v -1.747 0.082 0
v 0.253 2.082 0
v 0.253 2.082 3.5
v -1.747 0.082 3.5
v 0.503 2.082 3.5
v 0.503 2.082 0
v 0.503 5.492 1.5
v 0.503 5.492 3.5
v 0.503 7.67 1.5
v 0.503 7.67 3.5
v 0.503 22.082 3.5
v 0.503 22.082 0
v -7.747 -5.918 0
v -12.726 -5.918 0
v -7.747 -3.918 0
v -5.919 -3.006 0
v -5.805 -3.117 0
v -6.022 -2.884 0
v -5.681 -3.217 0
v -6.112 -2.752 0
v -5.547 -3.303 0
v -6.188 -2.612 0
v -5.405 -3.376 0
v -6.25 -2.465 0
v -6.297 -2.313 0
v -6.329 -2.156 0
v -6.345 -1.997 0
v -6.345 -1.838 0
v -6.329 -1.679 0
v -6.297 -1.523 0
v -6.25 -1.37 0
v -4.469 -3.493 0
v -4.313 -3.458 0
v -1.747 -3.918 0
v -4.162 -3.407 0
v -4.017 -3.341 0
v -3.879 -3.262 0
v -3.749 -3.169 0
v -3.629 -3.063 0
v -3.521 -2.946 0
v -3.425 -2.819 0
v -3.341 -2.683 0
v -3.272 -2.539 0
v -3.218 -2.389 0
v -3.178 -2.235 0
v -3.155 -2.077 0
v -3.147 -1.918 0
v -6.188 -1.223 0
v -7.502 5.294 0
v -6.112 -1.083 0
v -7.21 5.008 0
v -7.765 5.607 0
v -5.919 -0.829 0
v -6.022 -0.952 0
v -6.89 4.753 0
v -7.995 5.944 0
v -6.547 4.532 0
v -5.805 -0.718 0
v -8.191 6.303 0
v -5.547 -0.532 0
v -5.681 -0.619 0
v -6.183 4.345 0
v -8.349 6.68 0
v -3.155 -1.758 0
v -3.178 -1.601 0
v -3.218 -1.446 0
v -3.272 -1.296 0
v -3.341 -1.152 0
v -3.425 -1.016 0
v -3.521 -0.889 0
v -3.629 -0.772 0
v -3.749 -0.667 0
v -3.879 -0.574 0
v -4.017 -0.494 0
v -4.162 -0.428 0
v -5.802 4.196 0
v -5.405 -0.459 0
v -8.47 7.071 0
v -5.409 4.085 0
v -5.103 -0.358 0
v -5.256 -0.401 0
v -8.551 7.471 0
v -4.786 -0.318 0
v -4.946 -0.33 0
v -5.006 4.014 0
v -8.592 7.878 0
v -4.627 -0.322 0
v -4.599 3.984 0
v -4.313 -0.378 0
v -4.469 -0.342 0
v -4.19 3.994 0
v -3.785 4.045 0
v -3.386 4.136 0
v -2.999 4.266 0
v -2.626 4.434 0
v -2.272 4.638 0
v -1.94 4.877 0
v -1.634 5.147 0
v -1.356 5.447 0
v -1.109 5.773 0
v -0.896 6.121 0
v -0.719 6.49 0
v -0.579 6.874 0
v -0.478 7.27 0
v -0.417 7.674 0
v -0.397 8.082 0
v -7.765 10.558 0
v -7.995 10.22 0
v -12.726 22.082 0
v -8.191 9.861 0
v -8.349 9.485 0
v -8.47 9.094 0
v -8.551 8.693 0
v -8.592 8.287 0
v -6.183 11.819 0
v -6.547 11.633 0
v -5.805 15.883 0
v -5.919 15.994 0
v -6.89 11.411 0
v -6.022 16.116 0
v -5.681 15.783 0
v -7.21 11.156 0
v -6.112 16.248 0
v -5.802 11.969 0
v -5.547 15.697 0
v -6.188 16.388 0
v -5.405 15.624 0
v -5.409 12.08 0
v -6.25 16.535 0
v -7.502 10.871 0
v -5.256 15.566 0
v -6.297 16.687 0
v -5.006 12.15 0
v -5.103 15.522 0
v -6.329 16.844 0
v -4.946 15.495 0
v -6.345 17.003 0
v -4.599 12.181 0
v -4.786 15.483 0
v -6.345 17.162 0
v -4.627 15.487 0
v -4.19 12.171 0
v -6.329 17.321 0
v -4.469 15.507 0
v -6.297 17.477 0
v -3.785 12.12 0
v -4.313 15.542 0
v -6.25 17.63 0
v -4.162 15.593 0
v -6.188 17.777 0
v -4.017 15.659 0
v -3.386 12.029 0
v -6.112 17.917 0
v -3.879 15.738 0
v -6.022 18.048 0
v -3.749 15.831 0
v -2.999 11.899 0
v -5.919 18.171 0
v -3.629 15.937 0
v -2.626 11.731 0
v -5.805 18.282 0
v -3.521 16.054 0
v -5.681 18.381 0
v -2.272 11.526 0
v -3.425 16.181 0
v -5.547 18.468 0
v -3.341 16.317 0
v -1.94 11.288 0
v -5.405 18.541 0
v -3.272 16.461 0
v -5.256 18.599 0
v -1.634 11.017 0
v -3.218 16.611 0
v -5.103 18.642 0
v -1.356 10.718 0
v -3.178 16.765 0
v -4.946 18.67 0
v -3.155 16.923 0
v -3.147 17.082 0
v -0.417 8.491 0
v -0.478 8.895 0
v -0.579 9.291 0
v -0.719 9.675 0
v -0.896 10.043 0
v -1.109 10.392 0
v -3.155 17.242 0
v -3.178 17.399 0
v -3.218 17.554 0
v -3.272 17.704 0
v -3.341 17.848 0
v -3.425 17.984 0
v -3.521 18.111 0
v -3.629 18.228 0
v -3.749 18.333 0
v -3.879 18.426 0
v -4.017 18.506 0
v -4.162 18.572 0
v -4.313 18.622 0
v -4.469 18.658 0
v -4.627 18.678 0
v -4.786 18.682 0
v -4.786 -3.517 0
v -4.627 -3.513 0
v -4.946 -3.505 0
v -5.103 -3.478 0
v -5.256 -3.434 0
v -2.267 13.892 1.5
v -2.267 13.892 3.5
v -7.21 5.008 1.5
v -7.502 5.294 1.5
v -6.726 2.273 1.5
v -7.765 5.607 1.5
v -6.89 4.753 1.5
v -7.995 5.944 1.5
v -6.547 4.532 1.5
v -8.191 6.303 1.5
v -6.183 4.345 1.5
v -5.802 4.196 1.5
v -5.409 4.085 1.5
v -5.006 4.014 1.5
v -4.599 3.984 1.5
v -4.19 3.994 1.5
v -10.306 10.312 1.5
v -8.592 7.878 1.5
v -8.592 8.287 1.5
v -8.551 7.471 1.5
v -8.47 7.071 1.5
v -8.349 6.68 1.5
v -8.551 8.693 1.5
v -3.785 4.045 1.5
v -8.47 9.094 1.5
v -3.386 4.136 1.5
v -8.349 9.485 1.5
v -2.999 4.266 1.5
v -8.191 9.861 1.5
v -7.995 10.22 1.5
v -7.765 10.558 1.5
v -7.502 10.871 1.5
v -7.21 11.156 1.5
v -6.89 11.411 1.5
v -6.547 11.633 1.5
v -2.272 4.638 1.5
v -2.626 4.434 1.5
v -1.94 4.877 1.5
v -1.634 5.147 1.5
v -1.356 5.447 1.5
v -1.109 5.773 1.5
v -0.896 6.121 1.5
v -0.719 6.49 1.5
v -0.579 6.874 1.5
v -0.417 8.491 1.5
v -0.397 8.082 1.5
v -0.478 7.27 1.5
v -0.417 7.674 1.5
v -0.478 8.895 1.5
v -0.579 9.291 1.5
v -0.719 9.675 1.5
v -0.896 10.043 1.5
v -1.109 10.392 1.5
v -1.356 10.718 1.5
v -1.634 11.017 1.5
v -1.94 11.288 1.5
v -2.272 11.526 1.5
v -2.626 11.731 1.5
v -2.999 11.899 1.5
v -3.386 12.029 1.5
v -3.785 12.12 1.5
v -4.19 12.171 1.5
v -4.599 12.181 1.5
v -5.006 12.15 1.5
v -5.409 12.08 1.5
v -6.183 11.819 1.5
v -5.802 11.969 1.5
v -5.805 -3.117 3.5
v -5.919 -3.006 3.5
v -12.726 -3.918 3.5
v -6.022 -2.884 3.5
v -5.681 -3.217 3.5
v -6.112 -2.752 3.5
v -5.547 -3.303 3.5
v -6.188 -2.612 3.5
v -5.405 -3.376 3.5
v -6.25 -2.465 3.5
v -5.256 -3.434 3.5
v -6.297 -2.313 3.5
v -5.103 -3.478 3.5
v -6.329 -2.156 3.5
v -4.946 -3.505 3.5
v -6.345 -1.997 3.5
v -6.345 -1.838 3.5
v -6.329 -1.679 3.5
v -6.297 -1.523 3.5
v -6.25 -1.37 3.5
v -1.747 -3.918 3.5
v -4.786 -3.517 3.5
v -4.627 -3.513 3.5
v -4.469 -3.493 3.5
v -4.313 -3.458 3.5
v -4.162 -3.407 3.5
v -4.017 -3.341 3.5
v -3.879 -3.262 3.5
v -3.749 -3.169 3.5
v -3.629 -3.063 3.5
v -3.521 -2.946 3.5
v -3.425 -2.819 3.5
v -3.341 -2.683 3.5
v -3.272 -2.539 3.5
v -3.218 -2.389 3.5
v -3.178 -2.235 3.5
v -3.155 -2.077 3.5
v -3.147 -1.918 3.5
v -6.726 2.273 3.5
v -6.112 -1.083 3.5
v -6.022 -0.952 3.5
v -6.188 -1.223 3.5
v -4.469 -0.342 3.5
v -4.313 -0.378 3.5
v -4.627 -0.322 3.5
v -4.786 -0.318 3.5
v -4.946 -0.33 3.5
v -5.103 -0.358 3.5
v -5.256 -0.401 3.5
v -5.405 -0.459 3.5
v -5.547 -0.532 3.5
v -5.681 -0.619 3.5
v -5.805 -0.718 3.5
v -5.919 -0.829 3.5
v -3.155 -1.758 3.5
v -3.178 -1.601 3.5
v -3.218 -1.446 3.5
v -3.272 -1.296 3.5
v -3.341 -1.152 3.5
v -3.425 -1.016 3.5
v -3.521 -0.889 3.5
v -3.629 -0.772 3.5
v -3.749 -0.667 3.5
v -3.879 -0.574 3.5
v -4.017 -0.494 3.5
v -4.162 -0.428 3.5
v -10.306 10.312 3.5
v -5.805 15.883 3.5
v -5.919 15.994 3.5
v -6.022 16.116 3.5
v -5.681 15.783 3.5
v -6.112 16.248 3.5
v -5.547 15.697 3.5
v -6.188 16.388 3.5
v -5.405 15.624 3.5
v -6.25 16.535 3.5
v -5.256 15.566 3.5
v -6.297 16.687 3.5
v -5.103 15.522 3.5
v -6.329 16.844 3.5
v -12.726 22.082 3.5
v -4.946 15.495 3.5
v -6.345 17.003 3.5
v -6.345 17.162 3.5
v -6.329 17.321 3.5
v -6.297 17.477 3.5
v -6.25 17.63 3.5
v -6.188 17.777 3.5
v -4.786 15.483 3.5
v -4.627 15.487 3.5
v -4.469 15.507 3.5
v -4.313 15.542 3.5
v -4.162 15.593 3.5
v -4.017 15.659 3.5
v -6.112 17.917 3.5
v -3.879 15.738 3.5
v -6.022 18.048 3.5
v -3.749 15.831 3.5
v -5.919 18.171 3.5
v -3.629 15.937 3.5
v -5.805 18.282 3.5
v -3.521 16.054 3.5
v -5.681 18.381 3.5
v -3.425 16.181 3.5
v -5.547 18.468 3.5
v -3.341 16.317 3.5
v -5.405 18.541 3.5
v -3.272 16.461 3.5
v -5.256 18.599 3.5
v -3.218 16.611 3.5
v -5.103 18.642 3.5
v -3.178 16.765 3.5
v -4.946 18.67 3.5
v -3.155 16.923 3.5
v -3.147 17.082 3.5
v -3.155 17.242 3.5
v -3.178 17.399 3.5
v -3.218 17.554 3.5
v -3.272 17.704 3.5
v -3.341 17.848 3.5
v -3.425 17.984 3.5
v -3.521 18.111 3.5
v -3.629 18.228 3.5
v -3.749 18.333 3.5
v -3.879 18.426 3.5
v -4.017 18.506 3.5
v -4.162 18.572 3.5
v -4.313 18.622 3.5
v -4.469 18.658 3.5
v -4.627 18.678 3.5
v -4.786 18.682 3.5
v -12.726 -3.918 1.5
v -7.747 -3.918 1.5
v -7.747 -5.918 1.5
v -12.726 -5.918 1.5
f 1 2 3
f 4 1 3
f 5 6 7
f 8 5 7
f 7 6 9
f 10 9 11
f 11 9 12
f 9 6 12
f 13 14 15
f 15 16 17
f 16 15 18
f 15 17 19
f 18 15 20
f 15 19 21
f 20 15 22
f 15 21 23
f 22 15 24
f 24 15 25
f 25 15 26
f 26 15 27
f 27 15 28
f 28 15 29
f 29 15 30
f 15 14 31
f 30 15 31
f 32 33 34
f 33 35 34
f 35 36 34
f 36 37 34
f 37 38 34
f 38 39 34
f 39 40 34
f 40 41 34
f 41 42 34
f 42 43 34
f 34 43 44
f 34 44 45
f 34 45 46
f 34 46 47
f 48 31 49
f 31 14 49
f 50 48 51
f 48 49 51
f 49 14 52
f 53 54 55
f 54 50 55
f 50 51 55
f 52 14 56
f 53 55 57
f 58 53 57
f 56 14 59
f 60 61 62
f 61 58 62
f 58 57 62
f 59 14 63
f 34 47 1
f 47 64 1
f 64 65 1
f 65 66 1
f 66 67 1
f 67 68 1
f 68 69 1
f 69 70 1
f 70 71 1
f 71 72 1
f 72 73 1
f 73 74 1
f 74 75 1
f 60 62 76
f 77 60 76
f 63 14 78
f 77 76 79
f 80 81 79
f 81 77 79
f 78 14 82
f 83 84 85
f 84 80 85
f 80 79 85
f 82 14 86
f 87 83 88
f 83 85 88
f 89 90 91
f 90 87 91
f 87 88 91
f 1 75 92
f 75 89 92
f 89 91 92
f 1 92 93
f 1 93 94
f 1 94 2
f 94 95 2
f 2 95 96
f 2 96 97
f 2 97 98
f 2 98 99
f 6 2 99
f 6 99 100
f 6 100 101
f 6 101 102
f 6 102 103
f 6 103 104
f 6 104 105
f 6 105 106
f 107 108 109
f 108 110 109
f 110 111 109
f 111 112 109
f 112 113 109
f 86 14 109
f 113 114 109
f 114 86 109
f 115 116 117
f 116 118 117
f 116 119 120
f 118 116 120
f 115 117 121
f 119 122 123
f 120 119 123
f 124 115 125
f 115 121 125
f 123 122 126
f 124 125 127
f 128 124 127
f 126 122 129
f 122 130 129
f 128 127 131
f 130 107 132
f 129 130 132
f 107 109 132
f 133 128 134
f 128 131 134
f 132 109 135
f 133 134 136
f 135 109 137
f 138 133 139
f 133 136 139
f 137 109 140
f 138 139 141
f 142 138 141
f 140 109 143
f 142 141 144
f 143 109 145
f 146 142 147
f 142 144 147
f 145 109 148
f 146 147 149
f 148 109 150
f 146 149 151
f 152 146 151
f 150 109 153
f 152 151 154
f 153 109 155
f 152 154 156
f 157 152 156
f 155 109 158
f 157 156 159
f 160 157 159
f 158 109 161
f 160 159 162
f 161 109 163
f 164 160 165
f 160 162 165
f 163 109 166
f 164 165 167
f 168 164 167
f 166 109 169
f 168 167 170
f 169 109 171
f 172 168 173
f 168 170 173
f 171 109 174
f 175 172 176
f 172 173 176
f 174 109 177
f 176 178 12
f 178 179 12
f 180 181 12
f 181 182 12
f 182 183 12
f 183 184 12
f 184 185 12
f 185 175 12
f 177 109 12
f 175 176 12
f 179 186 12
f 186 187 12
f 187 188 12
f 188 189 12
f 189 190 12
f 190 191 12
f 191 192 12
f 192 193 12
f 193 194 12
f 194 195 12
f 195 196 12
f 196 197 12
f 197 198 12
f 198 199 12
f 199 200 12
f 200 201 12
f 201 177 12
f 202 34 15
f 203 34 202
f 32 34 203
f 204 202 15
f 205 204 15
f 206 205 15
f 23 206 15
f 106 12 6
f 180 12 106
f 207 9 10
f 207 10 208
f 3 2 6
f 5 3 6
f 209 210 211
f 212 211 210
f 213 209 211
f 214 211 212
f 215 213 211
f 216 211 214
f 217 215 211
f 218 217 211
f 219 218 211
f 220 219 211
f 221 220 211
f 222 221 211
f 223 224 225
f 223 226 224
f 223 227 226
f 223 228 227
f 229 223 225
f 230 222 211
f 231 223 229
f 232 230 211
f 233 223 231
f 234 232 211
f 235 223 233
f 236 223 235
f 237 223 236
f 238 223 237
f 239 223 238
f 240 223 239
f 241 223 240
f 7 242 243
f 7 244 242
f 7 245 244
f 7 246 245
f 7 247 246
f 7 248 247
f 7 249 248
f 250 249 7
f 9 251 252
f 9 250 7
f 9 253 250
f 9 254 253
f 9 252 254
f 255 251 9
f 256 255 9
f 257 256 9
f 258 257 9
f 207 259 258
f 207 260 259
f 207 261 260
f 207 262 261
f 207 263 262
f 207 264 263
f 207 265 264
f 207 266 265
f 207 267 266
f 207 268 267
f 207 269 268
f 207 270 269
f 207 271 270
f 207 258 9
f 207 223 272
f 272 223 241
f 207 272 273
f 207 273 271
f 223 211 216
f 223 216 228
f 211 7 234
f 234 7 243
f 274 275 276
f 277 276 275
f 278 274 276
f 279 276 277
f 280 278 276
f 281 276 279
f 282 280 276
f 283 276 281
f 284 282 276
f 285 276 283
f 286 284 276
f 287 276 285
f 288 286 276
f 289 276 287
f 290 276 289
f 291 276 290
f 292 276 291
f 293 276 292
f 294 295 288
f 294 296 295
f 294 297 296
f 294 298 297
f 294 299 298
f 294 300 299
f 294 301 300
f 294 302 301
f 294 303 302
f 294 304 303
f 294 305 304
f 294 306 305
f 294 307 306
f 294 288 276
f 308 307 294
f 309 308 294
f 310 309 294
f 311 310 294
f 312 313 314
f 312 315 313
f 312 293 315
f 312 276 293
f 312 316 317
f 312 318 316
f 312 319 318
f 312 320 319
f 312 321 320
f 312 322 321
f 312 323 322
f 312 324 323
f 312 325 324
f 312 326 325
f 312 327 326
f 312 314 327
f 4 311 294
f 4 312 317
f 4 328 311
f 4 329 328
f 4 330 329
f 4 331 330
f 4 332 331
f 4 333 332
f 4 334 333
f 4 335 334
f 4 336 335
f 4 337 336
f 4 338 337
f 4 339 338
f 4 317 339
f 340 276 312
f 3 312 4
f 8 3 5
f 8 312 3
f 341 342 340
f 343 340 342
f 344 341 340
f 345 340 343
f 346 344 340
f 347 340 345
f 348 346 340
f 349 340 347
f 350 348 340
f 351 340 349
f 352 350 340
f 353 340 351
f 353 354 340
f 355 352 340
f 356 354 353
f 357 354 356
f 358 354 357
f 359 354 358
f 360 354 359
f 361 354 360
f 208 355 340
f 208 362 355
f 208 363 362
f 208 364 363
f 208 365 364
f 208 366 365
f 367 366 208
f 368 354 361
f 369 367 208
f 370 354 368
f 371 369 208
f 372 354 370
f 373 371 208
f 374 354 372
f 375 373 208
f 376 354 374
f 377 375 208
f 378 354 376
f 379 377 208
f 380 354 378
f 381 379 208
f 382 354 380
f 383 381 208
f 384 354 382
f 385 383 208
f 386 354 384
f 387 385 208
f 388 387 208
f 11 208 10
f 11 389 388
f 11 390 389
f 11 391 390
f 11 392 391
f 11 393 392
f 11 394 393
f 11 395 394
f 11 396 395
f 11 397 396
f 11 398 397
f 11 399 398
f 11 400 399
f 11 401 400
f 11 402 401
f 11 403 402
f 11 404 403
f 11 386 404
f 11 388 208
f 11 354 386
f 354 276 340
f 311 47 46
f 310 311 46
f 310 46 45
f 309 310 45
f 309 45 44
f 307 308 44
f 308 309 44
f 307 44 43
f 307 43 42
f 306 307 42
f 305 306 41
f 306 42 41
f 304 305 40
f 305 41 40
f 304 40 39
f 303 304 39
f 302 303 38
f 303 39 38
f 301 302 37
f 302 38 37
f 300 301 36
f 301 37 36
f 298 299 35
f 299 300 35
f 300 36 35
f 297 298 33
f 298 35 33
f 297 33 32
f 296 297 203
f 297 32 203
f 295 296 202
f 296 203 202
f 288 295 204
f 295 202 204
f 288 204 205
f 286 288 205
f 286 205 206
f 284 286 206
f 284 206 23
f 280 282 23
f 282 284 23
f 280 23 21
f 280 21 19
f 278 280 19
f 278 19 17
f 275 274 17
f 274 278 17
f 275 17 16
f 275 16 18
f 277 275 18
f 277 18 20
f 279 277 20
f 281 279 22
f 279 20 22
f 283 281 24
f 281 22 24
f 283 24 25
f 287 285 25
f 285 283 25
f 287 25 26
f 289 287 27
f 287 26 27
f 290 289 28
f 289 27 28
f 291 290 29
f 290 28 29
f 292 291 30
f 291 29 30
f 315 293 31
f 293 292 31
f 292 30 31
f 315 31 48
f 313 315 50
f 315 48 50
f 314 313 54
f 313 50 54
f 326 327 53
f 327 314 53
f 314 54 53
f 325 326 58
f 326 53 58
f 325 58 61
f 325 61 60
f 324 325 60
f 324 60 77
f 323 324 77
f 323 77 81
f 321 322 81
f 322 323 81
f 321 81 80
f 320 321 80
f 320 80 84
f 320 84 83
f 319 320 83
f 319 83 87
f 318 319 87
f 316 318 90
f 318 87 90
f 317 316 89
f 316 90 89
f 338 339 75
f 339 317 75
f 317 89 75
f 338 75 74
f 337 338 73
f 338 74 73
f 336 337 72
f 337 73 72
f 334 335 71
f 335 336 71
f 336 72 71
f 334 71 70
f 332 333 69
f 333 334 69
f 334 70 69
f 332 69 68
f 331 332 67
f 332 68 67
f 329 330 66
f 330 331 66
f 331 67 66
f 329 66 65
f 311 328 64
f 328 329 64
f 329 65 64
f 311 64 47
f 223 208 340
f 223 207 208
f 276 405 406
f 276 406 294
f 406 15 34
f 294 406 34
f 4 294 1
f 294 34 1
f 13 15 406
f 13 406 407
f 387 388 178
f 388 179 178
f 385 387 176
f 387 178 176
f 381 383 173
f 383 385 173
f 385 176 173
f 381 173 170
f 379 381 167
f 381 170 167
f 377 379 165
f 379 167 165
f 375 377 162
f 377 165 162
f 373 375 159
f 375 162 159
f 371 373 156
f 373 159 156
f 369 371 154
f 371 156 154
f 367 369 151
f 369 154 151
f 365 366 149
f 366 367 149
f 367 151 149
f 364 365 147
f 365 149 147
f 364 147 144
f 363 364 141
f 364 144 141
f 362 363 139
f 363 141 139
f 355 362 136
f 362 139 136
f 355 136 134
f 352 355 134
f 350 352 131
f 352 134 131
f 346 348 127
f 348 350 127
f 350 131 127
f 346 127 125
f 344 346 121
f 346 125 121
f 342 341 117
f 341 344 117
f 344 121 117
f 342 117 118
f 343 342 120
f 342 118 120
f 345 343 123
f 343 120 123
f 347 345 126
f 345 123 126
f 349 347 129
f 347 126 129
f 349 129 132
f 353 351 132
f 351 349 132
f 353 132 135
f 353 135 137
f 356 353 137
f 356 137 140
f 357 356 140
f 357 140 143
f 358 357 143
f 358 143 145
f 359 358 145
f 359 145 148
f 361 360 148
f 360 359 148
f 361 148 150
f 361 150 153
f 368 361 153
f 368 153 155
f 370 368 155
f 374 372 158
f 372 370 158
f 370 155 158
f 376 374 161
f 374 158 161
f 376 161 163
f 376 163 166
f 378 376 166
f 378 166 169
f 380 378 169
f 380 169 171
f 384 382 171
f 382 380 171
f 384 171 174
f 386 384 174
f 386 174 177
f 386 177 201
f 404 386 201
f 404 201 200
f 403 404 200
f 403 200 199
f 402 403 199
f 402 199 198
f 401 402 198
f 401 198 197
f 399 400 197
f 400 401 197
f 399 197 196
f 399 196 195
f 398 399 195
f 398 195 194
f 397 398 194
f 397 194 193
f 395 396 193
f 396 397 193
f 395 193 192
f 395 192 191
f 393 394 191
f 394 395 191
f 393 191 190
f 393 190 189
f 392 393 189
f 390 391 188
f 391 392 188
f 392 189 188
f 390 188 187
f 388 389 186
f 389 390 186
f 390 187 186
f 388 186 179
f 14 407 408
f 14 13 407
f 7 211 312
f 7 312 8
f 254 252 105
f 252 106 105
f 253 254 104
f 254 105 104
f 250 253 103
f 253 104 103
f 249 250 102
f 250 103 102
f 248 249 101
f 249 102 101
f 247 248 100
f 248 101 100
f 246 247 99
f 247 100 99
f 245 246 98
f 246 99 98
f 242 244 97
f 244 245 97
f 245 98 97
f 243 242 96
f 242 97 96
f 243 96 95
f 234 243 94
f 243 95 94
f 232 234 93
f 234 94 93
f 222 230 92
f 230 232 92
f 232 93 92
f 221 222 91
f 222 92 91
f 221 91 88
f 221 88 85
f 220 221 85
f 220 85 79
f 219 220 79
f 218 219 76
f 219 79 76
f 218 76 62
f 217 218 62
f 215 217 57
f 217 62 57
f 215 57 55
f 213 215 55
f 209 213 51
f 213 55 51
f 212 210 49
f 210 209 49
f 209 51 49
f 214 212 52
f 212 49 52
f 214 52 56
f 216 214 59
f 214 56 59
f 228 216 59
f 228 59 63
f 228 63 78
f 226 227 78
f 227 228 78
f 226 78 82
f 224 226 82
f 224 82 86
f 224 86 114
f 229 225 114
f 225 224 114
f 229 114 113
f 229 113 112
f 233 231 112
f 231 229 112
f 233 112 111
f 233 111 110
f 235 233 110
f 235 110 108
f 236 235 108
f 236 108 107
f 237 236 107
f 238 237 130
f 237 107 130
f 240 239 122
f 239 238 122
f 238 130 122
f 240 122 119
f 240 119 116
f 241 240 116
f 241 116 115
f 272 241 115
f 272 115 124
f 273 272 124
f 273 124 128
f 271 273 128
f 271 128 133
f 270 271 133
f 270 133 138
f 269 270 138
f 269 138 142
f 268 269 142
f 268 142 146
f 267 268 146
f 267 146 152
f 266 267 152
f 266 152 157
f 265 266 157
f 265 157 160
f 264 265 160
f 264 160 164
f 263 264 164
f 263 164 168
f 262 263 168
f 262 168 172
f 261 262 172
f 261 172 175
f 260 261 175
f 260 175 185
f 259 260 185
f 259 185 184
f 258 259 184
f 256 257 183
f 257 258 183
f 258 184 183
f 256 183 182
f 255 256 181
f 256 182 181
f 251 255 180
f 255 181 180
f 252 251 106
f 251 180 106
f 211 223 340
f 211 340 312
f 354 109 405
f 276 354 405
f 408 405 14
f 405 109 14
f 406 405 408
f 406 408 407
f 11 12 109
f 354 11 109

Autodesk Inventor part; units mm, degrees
ref_plane "YZ Plane" through (0, 0, 0) normal (1, 0, 0) x (0, 1, 0)
ref_plane "XZ Plane" through (0, 0, 0) normal (0, 1, 0) x (-1, 0, 0)
ref_plane "Arbeitsebene1" through (0, 0, 0) normal (0, 0, 1) x (1, 0, 0)
sketch "Skizze1" plane through (0, 0, 0) normal (0, 0, 1) x (1, 0, 0)
  line L0 (-7.7466, -5.9177) -> (-1.7466, -5.9177)
  line L1 (-1.7466, -5.9177) -> (-1.7466, 2.0823)
  line L2 (-1.7466, 2.0823) -> (-7.7466, 2.0823)
  line L3 (-7.7466, 2.0823) -> (-7.7466, -5.9177)
  line L4 (-7.7466, -5.9177) -> (-1.7466, 2.0823) construction
  line L5 (-1.7466, -5.9177) -> (-7.7466, 2.0823) construction
  line L6 (-7.7466, -5.9177) -> (-1.7466, -5.9177)
  line L7 (-1.7466, -5.9177) -> (-1.7466, -3.9177)
  line L8 (-1.7466, -3.9177) -> (-7.7466, -3.9177)
  line L9 (-7.7466, -3.9177) -> (-7.7466, -5.9177)
  circle A0 centre (-4.7466, -1.9177) radius 1.6
  line L10 (0.5034, 22.0823) -> (-10.1632, 22.0823)
  line L11 (-10.1632, 22.0823) -> (-10.1632, 2.0823)
  line L12 (-10.1632, 2.0823) -> (0.5034, 2.0823)
  line L13 (0.5034, 2.0823) -> (0.5034, 22.0823)
  line L14 (0.5034, 22.0823) -> (-10.1632, 2.0823) construction
  line L15 (-10.1632, 22.0823) -> (0.5034, 2.0823) construction
  circle A1 centre (-4.7466, 17.0823) radius 1.6
  circle A2 centre (-4.4966, 8.0823) radius 4.1
  line L16 (-7.7466, -5.9177) -> (-10.1632, -5.9177)
  line L17 (-10.1632, -5.9177) -> (-10.1632, 2.0823)
  line L18 (-10.1632, 2.0823) -> (-7.7466, 2.0823)
  line L19 (-7.7466, 2.0823) -> (-7.7466, -5.9177)
  line L20 (-10.1632, -5.9177) -> (-12.7262, -5.9177)
  line L21 (-12.7262, -5.9177) -> (-12.7262, 22.0823)
  line L22 (-12.7262, 22.0823) -> (-10.1632, 22.0823)
  line L23 (-10.1632, 22.0823) -> (-10.1632, -5.9177)
  point P0 (0, 0)
  point P1 (-7.7466, -3.9177)
  point P2 (-4.8299, 12.0823)
  point P3 (-1.7466, 2.0823)
  point P4 (-7.7466, 2.0823)
  point P5 (-4.7466, 2.0823)
  dimension "d0" = 6
  dimension "d1" = 8
  dimension "d10" = 2
  dimension "d11" = 3.2
  dimension "d12" = 20
  dimension "d13" = 3.2
  dimension "d14" = 19
  dimension "d15" = 8.2
  dimension "d44" = 0
  dimension "d45" = 5.25
  dimension "d46" = 9
  dimension "d53" = 0.25
ref_plane "Arbeitsebene2" through (-9.2536, 3.4368, 4) normal (0, 0, 1) x (1, -0.0003, 0)
extrude "Extrusion1" add sketch "Skizze1" along normal blind 1.5 contours L16 L17 L12 L3 | L3 L2 L1 L8 | L20 L21 L22 L11 L17 | L12 L11 L10 L13 L2
sketch "Skizze4" plane through (0, 0, 1.5) normal (0, 0, 1) x (1, 0, 0)
  line L0 (-55.6662, 35.6355) -> (-7.4062, 35.6355) construction
  line L1 (-7.4062, 35.6355) -> (-7.4062, -28.7112) construction
  line L2 (-7.4062, -28.7112) -> (-55.6662, -28.7112) construction
  line L3 (-55.6662, -28.7112) -> (-55.6662, 35.6355) construction
  line L4 (-34.8105, 18.9517) -> (-34.8105, 11.3513)
  line L5 (-34.8105, 11.3513) -> (-29.4903, 14.6086)
  line L6 (-1.7466, -3.9177) -> (-1.7466, 2.0823) projected
  line L7 (-1.7466, 2.0823) -> (0.5034, 2.0823) projected
  line L8 (0.5034, 2.0823) -> (0.5034, 22.0823) projected
  line L9 (-7.7466, -5.9177) -> (-7.7466, -3.9177) projected
  line L10 (-7.7466, -3.9177) -> (-1.7466, -3.9177) projected
  circle A0 centre (-4.7466, 17.0823) radius 1.6 projected
  circle A1 centre (-4.4966, 8.0823) radius 4.1 projected
  circle A2 centre (-4.7466, -1.9177) radius 1.6 projected
  line L11 (1.3127, 5.8523) -> (-2.2666, 13.8915)
  line L12 (-2.2666, 13.8915) -> (-10.3058, 10.3122)
  line L13 (-10.3058, 10.3122) -> (-6.7265, 2.273)
  line L14 (-6.7265, 2.273) -> (1.3127, 5.8523)
  line L15 (1.3127, 5.8523) -> (-10.3058, 10.3122) construction
  line L16 (-2.2666, 13.8915) -> (-6.7265, 2.273) construction
  line L17 (1.3127, 5.8523) -> (10.1127, 5.8523) construction
  line L18 (0.5034, 22.0823) -> (-12.7262, 22.0823) projected
  line L19 (-12.7262, 22.0823) -> (-12.7262, -5.9177) projected
  line L20 (-12.7262, -5.9177) -> (-7.7466, -5.9177) projected
  line L21 (-7.7466, -3.9177) -> (-1.7466, -3.9177) projected
  line L22 (-7.7466, -3.9177) -> (-12.7262, -3.9177)
  line L23 (-12.7262, 22.0823) -> (-12.7262, -5.9177) projected
  point P0 (0, 0)
  point P1 (0.5034, 5.492)
  point P2 (0.5034, 7.6699)
  dimension "d40" = 8.8
  dimension "d41" = 114
  dimension "d42" = 8.8
extrude "Extrusion4" add sketch "Skizze4" along normal blind 2 contours L10 L22 L19 L18 L8 L11 L12 L13 L14 L7 L6
chamfer "Fase2" distance 2 angle 45 1 edges at (-1.7466, 2.0823, 1.75)
properties part number "30_Linear_Stage_NEMA11_baseholder_bayonetmount_objective_autofocus_kes400_camerabracket_underAnAngle"
